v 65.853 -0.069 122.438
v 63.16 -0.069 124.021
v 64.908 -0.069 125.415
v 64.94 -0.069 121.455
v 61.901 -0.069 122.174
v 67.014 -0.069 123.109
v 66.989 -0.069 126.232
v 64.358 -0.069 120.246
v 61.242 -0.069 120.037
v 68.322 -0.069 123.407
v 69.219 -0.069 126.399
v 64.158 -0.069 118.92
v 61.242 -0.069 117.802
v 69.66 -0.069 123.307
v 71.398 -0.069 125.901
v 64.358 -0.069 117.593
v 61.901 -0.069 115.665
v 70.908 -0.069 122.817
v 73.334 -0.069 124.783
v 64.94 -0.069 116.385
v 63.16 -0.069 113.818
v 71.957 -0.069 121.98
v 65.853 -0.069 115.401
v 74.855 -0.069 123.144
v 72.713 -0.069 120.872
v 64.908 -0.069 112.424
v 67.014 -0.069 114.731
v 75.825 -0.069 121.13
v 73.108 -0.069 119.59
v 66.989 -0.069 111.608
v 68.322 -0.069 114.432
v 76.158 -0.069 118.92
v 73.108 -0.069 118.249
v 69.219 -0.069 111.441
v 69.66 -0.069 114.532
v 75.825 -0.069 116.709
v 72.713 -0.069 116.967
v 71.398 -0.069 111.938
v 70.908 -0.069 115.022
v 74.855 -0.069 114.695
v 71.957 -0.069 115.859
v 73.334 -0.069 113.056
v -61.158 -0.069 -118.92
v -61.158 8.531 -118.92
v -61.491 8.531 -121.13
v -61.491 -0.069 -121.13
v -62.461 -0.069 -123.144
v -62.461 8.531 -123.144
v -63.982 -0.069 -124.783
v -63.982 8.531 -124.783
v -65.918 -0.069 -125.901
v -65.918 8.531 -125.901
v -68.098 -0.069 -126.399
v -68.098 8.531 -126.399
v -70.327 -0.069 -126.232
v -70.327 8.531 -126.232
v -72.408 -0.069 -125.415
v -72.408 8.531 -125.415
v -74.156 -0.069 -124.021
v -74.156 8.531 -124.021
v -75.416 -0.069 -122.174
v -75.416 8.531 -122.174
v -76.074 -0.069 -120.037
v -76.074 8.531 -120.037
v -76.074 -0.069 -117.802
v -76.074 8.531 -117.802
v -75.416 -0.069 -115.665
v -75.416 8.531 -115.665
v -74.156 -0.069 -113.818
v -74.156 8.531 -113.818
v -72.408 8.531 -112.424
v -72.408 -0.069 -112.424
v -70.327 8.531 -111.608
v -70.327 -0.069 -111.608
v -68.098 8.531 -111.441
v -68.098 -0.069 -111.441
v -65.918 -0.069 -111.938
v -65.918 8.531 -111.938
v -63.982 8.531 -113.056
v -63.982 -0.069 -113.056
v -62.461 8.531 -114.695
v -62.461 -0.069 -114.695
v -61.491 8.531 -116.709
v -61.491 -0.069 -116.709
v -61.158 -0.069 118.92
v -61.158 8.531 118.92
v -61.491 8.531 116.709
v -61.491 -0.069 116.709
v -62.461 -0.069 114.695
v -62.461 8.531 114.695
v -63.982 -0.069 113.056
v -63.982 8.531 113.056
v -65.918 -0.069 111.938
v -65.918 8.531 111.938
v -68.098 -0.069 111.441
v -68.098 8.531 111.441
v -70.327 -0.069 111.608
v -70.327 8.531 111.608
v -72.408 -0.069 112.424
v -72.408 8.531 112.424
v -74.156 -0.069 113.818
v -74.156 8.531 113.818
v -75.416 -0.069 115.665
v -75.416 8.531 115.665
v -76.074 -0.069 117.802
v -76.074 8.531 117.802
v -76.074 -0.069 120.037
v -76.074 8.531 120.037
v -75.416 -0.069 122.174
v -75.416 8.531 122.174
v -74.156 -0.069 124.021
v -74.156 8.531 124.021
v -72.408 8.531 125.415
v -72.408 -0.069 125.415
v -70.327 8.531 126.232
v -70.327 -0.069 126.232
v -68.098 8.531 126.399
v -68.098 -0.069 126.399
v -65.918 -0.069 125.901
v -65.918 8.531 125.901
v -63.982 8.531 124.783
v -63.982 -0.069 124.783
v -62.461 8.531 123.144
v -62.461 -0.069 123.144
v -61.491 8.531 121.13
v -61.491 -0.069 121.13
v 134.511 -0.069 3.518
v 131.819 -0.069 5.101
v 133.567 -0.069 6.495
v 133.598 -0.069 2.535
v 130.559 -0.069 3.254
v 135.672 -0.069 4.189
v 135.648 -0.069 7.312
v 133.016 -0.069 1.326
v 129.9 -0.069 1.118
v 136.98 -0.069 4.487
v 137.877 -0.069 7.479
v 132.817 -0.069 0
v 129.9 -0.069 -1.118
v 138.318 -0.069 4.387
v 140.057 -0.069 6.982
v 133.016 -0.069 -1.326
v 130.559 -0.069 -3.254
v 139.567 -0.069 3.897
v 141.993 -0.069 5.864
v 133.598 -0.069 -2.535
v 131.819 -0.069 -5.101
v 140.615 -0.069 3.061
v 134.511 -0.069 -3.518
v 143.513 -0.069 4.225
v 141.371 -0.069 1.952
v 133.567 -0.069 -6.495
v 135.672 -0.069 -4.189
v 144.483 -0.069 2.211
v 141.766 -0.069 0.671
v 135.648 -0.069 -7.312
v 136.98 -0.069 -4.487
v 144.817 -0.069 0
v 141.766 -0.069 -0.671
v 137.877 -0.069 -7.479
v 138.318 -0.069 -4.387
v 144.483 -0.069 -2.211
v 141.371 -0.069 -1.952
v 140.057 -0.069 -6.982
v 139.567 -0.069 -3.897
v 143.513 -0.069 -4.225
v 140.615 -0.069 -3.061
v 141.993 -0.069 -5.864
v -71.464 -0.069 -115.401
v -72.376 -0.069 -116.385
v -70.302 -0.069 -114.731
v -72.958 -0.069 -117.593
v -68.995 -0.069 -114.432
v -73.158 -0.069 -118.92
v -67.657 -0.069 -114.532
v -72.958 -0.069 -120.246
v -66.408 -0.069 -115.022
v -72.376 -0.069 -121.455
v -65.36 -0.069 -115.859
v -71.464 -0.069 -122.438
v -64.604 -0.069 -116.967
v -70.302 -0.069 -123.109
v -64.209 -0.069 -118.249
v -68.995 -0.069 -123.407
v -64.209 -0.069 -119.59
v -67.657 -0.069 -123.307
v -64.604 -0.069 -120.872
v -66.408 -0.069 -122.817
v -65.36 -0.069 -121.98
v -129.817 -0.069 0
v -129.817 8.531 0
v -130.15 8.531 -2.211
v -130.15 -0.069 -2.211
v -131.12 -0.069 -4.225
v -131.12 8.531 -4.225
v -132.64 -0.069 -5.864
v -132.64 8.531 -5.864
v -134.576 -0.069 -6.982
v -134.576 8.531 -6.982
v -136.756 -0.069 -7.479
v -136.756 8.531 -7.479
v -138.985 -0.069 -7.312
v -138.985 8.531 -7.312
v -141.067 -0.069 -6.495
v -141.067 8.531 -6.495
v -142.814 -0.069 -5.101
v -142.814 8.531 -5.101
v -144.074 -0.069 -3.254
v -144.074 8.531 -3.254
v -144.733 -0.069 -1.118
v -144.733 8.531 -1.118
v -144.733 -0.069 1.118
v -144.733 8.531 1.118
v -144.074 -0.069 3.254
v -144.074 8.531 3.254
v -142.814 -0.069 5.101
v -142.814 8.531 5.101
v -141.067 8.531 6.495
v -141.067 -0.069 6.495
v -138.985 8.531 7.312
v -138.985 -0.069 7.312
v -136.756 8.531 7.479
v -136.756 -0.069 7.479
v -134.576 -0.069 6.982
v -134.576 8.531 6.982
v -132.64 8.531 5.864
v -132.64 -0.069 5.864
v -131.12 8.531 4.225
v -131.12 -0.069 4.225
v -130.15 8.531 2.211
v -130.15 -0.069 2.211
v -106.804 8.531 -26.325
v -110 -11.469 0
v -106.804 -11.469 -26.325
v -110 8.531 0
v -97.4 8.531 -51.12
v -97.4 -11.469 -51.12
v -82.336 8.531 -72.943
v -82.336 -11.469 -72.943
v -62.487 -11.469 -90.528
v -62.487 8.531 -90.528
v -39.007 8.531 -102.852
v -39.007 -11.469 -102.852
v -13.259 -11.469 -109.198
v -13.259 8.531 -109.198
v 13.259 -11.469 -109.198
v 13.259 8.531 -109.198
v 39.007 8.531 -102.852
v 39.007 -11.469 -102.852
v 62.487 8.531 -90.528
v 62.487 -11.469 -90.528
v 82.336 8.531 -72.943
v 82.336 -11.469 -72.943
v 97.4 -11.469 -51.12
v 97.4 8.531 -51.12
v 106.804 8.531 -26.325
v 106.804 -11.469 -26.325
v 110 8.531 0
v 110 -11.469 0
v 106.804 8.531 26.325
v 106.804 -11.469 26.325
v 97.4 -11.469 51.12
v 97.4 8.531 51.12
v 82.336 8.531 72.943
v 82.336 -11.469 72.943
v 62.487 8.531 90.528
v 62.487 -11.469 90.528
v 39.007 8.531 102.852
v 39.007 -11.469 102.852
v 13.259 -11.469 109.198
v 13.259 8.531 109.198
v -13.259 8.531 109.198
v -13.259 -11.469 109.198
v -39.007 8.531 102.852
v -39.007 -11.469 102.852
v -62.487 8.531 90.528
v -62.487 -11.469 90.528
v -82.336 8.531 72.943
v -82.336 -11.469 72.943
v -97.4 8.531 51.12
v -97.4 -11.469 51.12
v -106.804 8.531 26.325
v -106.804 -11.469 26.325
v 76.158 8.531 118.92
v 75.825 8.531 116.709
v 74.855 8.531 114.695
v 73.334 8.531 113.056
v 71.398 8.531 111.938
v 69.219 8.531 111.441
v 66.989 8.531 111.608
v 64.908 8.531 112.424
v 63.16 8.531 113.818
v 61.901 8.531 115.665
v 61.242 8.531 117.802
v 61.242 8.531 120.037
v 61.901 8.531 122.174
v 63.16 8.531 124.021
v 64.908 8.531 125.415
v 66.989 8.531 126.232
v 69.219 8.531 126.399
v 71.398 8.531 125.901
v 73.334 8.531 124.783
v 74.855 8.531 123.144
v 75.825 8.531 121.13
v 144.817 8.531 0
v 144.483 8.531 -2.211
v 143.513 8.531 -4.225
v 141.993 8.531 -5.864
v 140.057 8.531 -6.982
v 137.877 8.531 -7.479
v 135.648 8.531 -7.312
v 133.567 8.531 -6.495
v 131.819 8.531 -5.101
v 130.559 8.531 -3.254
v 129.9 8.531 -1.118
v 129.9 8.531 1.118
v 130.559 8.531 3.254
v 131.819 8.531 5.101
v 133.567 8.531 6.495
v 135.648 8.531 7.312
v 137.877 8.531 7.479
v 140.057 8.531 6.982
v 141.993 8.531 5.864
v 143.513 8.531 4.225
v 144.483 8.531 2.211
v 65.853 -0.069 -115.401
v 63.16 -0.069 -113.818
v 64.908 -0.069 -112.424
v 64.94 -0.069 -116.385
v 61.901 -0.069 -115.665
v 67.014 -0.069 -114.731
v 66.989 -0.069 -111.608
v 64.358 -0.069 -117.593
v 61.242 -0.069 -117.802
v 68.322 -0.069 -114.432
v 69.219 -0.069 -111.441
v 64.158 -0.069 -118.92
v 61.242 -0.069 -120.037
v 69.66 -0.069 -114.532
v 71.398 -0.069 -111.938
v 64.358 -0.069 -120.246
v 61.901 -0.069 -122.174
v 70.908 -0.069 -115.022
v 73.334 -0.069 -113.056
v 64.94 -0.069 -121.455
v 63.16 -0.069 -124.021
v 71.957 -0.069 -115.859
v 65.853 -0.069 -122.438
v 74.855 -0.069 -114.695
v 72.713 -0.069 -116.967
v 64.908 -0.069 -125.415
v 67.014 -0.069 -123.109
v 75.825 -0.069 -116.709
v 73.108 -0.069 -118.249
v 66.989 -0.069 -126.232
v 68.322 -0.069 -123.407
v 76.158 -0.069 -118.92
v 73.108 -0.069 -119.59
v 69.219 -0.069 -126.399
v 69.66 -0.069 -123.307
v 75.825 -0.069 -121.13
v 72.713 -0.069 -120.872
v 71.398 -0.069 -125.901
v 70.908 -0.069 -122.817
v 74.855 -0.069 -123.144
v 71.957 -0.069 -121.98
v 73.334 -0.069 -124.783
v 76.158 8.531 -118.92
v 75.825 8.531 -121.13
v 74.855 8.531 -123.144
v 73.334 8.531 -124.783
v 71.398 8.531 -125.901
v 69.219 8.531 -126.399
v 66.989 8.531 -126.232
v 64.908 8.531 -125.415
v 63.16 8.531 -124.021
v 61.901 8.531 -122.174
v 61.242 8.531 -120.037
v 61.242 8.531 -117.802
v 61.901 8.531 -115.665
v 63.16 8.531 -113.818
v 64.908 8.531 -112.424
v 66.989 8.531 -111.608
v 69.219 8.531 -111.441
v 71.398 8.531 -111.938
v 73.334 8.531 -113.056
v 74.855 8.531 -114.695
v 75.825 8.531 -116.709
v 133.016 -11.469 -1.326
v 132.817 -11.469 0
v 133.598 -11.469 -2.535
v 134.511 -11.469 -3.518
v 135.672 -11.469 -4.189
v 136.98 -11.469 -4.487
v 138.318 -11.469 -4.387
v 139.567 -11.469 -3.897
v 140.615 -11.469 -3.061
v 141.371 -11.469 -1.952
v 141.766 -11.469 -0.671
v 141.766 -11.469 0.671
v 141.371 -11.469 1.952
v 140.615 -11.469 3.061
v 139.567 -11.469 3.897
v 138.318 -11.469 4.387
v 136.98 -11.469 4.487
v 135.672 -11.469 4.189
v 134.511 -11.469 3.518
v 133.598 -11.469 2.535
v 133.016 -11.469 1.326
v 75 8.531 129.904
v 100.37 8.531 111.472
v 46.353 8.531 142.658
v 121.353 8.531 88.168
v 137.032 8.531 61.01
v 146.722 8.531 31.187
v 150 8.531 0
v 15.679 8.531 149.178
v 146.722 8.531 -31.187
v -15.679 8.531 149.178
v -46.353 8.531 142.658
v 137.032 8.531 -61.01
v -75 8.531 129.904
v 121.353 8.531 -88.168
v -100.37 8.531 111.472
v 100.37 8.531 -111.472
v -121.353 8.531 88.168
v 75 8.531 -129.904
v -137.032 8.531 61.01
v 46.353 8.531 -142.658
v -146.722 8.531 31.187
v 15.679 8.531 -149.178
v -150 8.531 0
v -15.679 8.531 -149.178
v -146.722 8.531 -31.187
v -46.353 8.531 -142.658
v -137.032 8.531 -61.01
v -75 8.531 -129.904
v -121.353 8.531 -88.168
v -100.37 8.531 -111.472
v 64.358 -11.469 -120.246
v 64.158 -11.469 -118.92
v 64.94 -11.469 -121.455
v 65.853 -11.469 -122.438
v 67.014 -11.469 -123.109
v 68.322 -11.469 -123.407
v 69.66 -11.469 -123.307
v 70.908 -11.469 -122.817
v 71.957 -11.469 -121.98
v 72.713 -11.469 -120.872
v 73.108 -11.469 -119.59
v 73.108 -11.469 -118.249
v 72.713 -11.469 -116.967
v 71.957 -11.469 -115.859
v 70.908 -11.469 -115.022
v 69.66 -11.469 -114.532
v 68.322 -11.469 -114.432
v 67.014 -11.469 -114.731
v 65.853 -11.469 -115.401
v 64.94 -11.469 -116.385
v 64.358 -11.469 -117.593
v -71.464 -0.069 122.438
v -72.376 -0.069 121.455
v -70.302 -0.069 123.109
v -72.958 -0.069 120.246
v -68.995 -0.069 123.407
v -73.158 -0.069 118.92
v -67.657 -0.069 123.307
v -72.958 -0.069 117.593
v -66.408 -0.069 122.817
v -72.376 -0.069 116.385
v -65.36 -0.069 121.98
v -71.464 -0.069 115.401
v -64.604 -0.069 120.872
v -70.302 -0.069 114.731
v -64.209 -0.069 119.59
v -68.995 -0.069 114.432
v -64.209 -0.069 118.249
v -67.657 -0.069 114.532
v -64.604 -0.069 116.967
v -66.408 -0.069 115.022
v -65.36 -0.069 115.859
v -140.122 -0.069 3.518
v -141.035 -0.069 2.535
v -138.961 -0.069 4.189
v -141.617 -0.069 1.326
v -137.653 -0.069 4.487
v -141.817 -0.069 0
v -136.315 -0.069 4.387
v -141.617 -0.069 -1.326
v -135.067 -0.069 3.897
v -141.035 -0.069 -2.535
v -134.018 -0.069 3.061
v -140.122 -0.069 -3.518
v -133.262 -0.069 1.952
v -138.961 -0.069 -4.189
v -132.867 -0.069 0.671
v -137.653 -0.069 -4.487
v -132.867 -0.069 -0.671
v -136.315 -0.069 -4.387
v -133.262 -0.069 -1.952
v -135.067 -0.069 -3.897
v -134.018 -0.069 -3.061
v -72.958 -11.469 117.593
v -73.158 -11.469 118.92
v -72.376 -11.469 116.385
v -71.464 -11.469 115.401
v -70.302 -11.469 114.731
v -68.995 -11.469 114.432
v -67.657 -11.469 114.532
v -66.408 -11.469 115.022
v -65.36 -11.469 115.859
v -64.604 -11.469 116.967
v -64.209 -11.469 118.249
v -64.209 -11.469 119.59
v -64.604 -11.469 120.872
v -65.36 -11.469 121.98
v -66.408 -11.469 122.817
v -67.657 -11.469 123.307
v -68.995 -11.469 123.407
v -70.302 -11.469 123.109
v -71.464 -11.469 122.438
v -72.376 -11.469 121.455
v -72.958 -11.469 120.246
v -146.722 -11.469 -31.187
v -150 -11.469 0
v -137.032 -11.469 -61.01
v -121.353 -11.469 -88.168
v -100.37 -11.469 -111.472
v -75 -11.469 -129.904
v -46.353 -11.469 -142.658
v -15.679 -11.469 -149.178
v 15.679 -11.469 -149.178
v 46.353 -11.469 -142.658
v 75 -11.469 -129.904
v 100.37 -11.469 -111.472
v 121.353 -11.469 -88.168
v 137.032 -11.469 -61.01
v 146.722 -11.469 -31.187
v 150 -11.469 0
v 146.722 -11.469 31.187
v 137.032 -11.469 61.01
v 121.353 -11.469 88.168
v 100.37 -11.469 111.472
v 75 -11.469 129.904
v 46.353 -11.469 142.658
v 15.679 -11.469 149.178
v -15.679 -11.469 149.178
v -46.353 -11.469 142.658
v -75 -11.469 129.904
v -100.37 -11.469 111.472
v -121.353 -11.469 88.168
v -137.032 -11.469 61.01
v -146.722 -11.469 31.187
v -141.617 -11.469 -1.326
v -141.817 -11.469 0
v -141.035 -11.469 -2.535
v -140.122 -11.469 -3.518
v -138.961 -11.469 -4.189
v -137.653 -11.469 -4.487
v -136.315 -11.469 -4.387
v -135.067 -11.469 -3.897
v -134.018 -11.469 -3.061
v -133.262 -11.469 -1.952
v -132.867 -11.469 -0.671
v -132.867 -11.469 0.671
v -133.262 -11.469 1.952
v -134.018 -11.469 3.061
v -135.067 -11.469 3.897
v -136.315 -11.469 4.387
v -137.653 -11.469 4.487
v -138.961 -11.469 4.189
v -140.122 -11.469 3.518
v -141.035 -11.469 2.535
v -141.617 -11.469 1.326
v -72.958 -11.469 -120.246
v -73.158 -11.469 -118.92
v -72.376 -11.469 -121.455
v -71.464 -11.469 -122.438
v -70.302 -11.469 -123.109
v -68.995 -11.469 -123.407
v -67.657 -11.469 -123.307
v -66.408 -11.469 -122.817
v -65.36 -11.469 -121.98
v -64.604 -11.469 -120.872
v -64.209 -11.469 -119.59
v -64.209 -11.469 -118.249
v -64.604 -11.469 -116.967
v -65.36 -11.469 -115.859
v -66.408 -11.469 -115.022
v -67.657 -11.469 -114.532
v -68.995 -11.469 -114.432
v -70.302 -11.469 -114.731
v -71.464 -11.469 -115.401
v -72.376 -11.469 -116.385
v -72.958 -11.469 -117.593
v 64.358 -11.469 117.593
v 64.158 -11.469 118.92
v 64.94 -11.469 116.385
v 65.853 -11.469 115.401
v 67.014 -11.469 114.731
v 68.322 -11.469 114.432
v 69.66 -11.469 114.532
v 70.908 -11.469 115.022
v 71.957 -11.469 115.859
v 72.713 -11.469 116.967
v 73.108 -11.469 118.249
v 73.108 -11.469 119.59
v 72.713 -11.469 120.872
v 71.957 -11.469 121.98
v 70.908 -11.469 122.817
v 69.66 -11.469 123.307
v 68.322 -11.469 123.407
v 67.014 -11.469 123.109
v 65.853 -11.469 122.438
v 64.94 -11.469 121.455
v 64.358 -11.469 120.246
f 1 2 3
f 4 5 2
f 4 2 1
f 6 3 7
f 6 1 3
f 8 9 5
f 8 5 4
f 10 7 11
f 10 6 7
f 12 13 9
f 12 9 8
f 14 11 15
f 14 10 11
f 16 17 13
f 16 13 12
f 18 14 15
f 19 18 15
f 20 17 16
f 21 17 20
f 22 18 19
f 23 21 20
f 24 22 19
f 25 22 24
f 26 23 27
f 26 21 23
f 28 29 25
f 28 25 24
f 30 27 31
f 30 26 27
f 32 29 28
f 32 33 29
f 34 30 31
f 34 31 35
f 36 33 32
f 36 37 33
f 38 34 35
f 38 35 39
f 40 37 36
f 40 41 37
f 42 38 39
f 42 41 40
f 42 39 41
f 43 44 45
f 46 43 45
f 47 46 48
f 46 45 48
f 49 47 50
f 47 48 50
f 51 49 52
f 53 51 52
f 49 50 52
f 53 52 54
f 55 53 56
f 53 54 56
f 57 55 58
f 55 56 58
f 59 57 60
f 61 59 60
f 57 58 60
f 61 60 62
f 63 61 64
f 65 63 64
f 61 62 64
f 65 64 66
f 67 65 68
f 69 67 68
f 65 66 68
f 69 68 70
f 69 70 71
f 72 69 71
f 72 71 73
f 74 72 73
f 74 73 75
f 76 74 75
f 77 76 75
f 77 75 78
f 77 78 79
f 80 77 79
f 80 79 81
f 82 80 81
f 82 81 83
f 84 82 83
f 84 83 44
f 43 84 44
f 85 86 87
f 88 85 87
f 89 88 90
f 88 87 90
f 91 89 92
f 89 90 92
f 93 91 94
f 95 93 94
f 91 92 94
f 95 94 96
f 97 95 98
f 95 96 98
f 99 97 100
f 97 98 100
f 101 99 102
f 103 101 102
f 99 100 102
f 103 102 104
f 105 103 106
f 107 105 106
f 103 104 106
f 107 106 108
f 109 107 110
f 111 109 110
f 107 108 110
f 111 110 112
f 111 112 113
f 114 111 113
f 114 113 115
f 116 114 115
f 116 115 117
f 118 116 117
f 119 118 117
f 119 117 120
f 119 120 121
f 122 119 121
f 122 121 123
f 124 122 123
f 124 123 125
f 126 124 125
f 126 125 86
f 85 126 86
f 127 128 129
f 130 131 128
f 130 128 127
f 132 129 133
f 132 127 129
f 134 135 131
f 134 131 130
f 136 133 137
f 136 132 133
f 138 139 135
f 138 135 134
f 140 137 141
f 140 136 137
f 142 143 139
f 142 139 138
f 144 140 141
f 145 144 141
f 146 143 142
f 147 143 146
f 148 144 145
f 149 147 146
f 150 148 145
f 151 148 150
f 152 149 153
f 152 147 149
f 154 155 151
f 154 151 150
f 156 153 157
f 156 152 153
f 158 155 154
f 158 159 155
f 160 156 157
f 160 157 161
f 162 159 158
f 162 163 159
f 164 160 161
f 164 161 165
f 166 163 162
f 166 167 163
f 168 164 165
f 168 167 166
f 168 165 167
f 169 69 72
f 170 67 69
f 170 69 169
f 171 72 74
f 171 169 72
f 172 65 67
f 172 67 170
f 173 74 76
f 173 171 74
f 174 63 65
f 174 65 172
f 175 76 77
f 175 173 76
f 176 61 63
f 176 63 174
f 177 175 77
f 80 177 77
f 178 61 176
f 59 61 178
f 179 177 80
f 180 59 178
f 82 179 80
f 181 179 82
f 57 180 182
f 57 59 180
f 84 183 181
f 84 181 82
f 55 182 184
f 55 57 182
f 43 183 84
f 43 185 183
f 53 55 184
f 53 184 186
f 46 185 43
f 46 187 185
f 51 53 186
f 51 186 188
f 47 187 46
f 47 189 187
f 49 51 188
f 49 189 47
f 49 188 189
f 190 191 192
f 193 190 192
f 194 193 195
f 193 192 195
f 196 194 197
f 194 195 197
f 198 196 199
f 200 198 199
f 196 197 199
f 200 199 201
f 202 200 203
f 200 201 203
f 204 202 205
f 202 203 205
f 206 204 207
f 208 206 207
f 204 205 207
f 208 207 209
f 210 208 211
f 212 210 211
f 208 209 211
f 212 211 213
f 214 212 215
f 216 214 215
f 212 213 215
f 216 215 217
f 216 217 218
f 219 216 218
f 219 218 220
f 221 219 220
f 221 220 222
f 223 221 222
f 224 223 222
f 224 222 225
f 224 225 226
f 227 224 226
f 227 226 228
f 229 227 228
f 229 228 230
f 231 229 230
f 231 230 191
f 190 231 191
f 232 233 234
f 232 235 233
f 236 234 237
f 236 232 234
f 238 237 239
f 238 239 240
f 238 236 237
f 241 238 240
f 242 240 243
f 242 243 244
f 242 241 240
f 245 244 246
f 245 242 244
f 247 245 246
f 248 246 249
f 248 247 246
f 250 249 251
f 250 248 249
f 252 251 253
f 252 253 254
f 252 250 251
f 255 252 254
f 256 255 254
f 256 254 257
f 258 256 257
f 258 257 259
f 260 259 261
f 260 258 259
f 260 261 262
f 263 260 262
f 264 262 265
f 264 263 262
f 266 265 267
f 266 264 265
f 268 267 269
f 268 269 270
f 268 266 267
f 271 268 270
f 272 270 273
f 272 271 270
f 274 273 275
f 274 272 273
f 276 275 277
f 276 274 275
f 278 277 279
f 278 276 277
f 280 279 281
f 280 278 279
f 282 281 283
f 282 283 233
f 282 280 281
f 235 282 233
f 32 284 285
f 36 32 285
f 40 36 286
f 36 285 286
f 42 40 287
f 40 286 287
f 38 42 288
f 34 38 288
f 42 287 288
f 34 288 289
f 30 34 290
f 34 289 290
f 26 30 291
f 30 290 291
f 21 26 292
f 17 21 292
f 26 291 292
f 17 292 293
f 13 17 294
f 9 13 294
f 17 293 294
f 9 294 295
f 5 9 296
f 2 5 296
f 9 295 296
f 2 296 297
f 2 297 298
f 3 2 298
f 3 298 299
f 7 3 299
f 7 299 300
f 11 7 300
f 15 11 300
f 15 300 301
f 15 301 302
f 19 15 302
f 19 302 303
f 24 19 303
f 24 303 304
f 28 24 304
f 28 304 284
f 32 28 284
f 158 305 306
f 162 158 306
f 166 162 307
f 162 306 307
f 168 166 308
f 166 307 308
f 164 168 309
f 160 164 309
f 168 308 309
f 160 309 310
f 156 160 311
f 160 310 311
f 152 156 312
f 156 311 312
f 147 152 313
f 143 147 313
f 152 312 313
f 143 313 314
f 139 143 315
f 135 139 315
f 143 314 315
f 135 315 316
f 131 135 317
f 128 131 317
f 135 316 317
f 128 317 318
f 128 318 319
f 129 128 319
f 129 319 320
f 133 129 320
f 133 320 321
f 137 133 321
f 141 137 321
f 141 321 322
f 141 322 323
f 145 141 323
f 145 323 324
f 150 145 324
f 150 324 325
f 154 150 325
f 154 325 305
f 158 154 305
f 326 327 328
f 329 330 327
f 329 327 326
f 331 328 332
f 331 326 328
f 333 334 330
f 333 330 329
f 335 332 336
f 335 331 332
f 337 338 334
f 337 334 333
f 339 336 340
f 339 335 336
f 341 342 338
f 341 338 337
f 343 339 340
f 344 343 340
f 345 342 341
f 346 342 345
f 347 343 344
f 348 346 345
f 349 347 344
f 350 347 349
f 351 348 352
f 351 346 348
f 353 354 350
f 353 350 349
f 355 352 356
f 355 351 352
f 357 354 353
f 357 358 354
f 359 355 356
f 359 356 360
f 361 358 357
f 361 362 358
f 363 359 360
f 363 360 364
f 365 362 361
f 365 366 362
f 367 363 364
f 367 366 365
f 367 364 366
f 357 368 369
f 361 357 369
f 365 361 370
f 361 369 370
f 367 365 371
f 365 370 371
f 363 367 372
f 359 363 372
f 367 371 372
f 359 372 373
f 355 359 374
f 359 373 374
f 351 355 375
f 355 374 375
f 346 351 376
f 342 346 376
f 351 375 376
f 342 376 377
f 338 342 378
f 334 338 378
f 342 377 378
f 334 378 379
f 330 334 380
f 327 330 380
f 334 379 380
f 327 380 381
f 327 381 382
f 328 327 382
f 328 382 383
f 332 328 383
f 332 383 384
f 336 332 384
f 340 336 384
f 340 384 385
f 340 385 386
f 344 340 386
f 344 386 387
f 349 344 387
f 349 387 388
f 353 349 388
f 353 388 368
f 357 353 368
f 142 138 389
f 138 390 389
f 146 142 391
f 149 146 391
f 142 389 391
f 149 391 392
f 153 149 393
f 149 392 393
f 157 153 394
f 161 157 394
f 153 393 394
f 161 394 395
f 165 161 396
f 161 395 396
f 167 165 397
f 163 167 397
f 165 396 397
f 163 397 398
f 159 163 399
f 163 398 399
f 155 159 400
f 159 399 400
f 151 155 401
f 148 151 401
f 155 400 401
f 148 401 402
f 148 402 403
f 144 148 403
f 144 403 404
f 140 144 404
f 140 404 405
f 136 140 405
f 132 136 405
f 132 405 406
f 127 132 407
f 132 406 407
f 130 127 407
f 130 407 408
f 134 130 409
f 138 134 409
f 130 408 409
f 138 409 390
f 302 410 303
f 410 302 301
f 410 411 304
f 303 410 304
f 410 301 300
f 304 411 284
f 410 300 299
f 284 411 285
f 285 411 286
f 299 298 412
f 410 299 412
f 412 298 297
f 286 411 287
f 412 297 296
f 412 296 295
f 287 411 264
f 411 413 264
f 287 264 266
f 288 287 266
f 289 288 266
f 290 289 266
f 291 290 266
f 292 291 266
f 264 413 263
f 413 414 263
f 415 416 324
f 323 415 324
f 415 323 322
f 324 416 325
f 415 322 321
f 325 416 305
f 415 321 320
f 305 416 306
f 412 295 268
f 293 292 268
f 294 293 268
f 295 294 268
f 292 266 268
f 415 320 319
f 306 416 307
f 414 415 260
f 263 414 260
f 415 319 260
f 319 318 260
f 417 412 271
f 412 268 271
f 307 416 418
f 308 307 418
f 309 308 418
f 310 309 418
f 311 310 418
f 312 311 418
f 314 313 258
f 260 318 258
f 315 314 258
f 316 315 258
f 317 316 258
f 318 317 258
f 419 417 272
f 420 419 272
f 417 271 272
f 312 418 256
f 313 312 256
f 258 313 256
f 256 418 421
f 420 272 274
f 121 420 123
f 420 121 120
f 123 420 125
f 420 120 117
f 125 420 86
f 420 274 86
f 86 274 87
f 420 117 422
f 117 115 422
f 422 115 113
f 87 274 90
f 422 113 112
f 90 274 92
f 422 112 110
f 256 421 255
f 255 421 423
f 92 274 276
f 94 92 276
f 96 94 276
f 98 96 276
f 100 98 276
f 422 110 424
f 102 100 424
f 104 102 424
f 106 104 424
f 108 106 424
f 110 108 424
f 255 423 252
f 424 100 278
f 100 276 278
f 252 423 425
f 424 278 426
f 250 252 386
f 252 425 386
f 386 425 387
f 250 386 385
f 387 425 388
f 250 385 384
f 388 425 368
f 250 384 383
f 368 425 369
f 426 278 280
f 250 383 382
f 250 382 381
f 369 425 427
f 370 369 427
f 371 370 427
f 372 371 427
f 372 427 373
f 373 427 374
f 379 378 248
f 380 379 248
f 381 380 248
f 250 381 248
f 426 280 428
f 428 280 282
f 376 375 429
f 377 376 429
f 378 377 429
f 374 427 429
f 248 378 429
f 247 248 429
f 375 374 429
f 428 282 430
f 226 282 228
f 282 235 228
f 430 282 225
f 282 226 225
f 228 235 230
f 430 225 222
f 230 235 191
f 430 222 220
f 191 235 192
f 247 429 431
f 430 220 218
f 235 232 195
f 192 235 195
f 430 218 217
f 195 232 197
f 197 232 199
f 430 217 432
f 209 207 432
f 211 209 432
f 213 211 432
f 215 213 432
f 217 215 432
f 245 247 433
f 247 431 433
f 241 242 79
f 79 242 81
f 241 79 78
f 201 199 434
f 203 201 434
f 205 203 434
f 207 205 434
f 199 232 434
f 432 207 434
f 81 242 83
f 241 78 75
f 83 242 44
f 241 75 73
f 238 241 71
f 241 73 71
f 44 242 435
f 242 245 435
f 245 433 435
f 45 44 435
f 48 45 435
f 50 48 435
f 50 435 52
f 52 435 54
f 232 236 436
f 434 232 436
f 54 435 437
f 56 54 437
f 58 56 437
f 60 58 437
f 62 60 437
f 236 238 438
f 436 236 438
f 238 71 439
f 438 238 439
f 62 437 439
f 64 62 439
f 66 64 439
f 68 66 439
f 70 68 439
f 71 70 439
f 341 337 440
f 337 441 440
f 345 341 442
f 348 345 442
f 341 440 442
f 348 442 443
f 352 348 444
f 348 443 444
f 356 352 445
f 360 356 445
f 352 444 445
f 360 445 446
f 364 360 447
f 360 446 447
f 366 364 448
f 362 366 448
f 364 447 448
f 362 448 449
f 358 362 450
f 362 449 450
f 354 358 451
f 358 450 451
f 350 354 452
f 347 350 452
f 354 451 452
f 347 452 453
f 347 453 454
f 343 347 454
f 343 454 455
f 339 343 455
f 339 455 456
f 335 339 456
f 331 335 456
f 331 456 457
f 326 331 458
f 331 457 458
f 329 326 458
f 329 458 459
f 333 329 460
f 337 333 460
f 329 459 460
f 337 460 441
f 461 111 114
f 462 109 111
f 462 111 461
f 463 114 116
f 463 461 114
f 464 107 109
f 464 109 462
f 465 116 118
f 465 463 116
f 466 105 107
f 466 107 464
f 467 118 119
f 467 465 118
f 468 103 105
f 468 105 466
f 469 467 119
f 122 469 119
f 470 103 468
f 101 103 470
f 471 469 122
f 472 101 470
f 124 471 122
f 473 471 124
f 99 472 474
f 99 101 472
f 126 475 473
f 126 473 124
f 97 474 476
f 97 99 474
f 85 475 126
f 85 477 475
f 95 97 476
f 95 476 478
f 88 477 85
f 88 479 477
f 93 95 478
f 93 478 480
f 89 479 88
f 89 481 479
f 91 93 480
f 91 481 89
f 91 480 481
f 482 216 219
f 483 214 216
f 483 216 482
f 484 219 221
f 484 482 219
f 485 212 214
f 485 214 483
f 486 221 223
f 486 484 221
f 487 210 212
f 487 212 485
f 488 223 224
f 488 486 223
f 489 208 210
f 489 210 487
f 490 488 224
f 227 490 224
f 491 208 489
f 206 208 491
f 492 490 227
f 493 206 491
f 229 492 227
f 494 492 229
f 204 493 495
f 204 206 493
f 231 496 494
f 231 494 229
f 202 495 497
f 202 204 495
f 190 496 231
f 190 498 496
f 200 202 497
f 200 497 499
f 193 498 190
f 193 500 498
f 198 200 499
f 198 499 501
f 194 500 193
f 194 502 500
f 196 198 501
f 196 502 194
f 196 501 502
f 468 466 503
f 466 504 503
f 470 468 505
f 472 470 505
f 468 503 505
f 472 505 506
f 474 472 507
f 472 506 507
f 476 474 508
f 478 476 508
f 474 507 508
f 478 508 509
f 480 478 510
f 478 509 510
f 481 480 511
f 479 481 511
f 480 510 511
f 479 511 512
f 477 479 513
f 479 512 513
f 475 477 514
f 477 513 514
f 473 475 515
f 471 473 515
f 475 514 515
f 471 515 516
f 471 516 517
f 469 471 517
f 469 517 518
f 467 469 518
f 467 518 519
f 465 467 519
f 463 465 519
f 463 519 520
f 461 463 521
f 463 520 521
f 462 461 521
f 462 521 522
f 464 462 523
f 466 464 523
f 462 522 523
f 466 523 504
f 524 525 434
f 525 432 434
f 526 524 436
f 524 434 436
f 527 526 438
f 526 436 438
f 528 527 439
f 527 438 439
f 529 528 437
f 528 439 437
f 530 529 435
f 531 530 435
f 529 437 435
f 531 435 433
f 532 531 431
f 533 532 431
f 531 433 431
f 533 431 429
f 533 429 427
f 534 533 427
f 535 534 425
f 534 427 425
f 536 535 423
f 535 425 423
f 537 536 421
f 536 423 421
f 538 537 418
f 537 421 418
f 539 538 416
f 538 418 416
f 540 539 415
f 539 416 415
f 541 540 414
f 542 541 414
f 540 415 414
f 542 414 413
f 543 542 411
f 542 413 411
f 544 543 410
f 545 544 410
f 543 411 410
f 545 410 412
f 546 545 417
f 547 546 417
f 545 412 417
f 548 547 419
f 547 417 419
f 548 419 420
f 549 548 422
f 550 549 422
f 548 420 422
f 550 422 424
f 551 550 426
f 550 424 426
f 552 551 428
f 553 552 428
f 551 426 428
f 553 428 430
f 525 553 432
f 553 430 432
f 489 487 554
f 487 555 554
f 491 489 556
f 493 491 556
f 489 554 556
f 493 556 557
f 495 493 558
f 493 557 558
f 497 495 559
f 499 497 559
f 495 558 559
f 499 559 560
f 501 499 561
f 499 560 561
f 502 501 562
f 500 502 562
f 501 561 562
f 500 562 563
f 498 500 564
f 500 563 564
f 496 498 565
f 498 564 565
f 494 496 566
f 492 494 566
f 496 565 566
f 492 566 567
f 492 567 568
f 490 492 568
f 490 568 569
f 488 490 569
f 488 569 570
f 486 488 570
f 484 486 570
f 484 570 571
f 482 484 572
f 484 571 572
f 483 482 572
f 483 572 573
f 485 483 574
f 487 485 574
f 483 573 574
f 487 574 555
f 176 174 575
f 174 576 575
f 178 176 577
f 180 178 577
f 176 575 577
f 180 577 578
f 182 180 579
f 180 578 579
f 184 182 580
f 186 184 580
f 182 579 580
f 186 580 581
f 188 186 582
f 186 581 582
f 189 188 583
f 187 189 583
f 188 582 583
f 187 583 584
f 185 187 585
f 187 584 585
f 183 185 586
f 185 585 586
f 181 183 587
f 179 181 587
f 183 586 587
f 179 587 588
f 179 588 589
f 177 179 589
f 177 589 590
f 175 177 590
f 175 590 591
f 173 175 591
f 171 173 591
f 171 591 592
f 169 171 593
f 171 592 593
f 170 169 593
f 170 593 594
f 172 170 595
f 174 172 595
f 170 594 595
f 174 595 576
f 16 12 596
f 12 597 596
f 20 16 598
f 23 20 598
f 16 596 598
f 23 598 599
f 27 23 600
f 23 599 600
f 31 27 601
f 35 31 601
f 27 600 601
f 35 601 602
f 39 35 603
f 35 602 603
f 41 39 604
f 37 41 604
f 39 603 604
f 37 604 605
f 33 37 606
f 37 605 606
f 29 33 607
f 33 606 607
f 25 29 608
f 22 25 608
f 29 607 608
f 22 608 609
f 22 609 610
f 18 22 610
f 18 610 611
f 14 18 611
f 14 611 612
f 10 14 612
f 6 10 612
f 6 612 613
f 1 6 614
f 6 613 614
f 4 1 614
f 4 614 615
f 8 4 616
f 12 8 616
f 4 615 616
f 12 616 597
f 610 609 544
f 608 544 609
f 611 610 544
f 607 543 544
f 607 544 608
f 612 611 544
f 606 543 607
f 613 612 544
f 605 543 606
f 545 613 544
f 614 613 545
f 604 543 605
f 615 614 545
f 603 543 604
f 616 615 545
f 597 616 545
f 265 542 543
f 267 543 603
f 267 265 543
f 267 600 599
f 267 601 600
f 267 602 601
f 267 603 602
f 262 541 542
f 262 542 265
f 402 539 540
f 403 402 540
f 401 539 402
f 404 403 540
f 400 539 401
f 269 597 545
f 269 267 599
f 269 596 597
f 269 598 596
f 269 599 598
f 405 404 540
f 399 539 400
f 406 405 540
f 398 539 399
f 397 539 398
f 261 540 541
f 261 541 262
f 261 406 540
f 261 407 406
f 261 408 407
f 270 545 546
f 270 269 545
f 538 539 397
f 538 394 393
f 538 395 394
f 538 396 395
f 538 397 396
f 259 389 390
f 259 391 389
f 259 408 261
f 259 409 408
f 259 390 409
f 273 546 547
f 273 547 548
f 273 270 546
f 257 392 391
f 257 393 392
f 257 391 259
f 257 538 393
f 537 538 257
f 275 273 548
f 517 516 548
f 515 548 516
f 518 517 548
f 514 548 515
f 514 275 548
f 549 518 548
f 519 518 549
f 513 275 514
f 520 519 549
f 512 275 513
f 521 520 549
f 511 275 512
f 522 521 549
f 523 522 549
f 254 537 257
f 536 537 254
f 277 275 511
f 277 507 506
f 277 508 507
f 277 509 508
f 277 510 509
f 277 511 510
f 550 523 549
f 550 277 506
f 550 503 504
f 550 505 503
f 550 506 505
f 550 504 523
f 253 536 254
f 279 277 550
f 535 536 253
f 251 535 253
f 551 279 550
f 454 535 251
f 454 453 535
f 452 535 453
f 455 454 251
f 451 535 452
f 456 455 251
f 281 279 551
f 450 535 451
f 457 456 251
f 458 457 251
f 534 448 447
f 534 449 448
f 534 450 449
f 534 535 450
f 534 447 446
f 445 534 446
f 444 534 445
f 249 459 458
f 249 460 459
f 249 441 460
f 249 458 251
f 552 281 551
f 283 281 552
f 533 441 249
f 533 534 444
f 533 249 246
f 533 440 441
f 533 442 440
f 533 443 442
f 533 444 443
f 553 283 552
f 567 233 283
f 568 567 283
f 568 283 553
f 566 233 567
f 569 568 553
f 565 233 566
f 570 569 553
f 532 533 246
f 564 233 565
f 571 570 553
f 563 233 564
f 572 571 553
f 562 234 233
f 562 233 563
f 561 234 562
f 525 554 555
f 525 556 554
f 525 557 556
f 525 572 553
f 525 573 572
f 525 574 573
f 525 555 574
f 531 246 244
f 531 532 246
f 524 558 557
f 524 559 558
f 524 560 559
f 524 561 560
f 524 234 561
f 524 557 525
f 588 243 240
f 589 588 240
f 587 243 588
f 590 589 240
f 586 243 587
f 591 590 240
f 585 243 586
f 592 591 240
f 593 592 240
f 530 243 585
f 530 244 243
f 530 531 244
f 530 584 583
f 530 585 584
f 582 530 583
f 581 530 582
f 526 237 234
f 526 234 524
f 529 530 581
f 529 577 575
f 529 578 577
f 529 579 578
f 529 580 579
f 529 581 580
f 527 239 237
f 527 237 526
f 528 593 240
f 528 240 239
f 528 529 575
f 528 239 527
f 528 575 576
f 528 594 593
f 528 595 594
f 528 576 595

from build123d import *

# Parameters (mm, degrees)
SZKIC1_W                                            = 40
SZKIC1_H                                            = 20
POG_BIENIE_WALCOWE_POD_M8_WKR_T_Z_BEM_W_D           = 9
POG_BIENIE_WALCOWE_POD_M8_WKR_T_Z_BEM_W_CBORE_D     = 15
POG_BIENIE_WALCOWE_POD_M8_WKR_T_Z_BEM_W_CBORE_DEPTH = 8.6


with BuildPart() as part:
    # Szkic1 → Obrót1 (revolve)
    with BuildSketch(Plane.XY):
        with Locations((-130, -1.468948521)):
            Rectangle(SZKIC1_W, SZKIC1_H)
    revolve(axis=Axis((0, 8.531051479, 0), (0, -1, 0)))

    # Pogłębienie walcowe pod M8 Wkręt z łbem walcowym z gniazdem sześciokątnym1 (through all)
    with Locations(Plane(origin=(2.665933908, 8.531051479, 0), x_dir=(1, 0, 0), z_dir=(0, 1, 0))):
        with Locations((-139.982449122, 0), (-71.324191515, 118.919590535), (65.9923237, 118.919590535), (134.650581307, 0), (65.9923237, -118.919590535), (-71.324191515, -118.919590535)):
            CounterBoreHole(POG_BIENIE_WALCOWE_POD_M8_WKR_T_Z_BEM_W_D / 2, POG_BIENIE_WALCOWE_POD_M8_WKR_T_Z_BEM_W_CBORE_D / 2, POG_BIENIE_WALCOWE_POD_M8_WKR_T_Z_BEM_W_CBORE_DEPTH)


solid = part.part
